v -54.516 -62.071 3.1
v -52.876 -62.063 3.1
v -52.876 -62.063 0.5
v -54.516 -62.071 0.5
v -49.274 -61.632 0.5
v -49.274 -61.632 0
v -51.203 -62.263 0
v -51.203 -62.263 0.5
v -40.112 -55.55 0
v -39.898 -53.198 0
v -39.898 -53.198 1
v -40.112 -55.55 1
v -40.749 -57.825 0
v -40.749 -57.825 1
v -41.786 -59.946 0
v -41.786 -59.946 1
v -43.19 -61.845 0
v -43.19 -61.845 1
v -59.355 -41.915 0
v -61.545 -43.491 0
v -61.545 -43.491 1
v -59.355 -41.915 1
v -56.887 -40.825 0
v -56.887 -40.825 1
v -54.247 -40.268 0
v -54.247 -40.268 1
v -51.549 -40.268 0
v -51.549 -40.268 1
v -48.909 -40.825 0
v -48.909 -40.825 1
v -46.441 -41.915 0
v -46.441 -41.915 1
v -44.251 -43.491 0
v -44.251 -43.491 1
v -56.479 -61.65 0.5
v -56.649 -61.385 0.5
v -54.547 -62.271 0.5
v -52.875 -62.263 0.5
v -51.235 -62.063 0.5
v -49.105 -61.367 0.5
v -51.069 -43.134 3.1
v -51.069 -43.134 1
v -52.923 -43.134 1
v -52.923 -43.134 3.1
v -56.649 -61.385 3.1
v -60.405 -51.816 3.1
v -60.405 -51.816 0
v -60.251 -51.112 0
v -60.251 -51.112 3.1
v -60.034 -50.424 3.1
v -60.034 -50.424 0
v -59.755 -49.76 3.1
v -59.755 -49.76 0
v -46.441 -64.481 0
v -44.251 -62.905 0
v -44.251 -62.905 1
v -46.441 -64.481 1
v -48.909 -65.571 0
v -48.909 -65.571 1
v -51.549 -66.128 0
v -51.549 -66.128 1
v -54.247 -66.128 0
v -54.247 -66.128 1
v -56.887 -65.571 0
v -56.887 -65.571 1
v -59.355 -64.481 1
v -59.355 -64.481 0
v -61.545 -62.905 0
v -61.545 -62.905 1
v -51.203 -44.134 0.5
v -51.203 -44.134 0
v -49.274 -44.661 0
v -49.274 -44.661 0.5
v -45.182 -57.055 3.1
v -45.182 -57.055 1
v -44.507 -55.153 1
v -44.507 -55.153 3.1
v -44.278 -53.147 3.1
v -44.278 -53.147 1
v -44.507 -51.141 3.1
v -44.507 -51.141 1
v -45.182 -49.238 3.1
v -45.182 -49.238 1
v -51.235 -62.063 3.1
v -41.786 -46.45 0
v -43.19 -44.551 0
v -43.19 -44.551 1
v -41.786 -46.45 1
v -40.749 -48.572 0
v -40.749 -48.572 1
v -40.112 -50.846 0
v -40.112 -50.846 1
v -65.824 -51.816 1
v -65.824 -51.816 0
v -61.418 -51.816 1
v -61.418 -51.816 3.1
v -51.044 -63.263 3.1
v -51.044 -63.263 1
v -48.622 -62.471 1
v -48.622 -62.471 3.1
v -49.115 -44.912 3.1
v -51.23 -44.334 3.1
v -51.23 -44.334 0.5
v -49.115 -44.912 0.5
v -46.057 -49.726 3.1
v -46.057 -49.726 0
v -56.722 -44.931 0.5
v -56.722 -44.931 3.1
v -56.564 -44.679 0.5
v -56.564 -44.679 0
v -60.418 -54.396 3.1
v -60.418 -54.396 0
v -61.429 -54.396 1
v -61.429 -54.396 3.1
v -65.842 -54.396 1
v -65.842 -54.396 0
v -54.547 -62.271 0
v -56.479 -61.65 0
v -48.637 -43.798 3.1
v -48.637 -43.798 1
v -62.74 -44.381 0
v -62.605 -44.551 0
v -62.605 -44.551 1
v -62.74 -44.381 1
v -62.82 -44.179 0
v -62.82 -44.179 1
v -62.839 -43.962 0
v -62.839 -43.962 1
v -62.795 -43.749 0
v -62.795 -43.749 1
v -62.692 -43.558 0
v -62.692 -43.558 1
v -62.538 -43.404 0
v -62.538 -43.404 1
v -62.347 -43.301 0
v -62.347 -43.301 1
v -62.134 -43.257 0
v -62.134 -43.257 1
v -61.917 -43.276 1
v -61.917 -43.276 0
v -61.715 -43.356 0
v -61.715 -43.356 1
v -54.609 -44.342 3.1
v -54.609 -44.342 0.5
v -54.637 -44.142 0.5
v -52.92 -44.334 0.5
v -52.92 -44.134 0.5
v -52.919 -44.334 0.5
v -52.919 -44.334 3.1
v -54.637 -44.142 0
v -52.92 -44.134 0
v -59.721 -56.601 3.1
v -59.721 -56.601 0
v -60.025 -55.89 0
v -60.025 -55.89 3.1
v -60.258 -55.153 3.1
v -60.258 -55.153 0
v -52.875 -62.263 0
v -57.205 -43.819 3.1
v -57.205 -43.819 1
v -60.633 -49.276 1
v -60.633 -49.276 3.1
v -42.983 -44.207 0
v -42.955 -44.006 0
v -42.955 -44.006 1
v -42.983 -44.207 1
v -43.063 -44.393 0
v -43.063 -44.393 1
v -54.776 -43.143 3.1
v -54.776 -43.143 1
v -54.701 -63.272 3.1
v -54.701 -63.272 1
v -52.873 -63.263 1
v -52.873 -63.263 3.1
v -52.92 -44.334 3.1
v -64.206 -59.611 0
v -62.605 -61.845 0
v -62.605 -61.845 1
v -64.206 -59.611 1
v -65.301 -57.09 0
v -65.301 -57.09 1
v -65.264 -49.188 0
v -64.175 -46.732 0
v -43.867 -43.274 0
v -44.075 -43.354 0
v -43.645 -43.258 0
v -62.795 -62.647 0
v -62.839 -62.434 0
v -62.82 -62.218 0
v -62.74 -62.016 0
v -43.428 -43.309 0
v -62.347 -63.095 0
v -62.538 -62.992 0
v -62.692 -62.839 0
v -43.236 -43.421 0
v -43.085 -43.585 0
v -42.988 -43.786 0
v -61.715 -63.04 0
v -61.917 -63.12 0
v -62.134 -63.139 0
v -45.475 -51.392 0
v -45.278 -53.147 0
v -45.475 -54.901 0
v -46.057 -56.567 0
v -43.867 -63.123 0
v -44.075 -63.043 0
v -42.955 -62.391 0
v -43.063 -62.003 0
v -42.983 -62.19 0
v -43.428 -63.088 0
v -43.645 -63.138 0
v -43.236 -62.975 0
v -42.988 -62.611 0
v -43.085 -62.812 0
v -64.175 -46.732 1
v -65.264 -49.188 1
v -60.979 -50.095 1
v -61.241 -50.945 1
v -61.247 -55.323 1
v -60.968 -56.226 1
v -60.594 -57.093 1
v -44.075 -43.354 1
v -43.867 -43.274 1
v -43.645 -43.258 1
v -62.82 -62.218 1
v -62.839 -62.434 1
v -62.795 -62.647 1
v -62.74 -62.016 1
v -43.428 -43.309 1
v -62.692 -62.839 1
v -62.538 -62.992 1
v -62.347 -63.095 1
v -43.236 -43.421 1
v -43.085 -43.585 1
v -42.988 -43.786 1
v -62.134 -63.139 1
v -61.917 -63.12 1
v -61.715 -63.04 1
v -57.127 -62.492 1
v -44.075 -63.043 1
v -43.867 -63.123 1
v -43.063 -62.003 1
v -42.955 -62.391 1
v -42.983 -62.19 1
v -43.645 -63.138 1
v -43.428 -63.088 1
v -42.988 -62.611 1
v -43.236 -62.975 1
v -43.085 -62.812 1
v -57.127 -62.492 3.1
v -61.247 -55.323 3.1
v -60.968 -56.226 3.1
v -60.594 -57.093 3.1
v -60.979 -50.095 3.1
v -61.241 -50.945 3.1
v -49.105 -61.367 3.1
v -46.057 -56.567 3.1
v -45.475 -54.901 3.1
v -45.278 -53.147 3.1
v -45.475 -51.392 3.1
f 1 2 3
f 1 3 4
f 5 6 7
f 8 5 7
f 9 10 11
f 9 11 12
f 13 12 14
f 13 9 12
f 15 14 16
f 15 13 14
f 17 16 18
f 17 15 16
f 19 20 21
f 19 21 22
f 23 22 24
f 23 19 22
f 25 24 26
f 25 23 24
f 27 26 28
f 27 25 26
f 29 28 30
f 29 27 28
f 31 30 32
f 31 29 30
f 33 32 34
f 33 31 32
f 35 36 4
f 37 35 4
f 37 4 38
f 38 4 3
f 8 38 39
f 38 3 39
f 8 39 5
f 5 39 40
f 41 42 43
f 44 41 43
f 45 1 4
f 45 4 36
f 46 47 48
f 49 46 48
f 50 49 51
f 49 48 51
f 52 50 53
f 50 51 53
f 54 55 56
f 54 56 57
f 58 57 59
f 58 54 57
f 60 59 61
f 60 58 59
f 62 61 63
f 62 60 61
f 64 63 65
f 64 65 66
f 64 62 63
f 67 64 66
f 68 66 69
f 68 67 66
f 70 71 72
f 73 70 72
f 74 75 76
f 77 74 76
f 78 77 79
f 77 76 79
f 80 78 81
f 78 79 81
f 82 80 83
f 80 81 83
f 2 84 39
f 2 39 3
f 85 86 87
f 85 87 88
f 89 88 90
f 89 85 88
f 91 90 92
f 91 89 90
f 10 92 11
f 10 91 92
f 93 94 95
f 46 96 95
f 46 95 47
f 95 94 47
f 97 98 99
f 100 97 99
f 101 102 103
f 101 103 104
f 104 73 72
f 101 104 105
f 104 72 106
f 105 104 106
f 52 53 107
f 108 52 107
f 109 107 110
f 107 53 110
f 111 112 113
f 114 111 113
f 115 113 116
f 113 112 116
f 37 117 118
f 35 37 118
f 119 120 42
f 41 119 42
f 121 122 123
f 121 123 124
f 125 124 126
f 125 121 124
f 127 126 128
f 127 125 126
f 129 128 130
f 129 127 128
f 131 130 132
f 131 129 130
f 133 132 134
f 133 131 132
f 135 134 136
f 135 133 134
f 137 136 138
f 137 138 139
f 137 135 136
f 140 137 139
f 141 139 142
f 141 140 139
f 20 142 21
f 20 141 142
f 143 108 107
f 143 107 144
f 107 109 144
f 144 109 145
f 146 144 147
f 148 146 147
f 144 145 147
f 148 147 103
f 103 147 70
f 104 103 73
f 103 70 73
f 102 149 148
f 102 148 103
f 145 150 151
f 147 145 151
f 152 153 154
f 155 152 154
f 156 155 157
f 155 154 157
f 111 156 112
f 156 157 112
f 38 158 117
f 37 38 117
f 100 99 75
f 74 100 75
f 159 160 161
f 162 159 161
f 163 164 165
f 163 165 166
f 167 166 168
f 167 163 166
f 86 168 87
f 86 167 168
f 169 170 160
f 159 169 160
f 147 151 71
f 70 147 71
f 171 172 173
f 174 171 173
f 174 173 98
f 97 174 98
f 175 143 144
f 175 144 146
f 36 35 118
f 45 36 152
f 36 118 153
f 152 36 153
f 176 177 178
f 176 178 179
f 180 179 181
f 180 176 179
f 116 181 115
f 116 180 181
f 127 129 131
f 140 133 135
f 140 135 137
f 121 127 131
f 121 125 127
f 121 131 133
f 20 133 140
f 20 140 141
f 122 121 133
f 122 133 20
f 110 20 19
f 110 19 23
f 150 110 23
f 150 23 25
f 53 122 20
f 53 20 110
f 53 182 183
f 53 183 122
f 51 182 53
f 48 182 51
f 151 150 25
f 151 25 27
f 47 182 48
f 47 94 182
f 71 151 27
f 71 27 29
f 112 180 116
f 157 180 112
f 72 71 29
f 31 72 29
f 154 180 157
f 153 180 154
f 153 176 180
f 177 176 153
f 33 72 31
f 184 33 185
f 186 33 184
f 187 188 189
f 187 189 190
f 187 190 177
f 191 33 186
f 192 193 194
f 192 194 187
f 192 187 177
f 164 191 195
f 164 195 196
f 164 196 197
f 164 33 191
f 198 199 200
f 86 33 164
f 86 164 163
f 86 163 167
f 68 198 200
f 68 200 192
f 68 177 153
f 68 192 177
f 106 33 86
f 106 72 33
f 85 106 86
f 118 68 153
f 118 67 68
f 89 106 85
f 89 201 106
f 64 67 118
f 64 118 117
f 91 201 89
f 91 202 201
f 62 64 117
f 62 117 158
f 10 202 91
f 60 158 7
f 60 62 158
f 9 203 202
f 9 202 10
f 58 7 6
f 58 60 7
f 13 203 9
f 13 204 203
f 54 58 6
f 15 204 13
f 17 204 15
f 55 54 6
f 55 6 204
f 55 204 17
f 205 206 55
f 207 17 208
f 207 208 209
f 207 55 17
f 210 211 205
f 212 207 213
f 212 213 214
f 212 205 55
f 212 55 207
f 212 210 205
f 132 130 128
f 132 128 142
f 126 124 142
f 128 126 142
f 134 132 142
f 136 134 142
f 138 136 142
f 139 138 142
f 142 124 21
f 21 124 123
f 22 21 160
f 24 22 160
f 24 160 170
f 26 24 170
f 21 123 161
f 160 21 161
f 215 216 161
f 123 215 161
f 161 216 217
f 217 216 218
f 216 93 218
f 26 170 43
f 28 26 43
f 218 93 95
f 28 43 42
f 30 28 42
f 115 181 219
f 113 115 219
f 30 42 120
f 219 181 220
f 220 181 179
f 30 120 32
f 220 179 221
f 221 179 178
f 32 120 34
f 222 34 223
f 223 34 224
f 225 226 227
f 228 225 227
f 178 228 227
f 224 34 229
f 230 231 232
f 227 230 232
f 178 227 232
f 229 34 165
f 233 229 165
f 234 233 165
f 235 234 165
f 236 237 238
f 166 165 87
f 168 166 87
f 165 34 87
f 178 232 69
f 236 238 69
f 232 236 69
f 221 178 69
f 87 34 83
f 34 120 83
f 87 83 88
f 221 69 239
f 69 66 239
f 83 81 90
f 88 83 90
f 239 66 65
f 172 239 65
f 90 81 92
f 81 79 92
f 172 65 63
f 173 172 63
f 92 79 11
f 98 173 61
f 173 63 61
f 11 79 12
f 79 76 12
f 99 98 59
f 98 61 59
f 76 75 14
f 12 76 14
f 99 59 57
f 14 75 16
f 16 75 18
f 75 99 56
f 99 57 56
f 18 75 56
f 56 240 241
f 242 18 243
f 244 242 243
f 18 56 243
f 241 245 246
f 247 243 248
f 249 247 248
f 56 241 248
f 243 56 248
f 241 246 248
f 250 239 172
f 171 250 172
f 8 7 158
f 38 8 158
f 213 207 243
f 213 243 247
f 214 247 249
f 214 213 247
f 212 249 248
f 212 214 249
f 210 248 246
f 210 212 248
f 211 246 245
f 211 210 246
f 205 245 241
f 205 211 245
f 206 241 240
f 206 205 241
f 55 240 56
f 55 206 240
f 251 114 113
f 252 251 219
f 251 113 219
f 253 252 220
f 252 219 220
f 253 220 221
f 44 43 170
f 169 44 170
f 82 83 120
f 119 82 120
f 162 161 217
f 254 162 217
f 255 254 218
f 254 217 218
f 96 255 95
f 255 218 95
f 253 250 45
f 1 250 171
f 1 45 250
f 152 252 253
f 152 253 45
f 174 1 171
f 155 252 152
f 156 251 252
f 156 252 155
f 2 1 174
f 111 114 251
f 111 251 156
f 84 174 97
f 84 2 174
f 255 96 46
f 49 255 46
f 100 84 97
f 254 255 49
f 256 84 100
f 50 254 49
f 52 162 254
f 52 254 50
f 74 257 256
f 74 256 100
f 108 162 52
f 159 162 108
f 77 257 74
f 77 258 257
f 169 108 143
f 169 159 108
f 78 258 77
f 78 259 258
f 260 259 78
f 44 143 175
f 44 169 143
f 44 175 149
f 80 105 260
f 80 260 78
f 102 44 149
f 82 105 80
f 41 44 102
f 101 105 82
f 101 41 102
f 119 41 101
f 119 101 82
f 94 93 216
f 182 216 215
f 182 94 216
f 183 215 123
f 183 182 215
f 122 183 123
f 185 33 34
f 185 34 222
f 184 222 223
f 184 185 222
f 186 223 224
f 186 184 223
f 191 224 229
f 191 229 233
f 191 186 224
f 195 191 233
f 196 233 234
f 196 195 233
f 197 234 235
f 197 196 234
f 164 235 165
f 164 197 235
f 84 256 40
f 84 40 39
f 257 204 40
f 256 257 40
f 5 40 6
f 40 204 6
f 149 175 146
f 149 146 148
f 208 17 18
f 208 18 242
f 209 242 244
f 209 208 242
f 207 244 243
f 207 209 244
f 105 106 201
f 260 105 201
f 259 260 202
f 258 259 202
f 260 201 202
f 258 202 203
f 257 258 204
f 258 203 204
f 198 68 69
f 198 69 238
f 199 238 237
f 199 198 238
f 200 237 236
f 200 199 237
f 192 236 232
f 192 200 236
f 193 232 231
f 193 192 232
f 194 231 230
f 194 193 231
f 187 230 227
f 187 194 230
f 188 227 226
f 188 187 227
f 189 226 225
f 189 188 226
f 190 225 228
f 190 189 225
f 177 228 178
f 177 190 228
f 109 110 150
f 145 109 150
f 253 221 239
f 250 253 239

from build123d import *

# Parameters (mm, degrees)
F1_DEPTH = 3.1
F3_DEPTH = 1
F5_DEPTH = 3.1
F7_DEPTH = 2.6


# Not quite as in the source:
# - ends of sketch curves that miss each other by under 0.0002 mm in the source are joined


with BuildPart() as f1:
    # F0 (on Top) → F1 (new body)
    with BuildSketch(Plane.XY):
        with BuildLine():
            Line((-45.1821846682, -49.2377741688), (-48.6372292437, -43.7981166044))
            Line((-48.6372292437, -43.7981166044), (-51.0690886894, -43.1337059986))
            Line((-51.0690886894, -43.1337059986), (-52.9226313652, -43.1337059986))
            Line((-52.9226313652, -43.1337059986), (-54.7761512226, -43.1429032238))
            Line((-54.7761512226, -43.1429032238), (-57.2046839443, -43.8193724666))
            Line((-57.2046839443, -43.8193724666), (-60.6326945623, -49.2761068966))
            ThreePointArc((-60.6326945623, -49.2761068966), (-61.5175196788, -53.1892877339), (-60.5939044307, -57.0934950318))
            Line((-60.5939044307, -57.0934950318), (-57.1270457212, -62.4923727119))
            Line((-57.1270457212, -62.4923727119), (-54.7013924586, -63.2718429691))
            Line((-54.7013924586, -63.2718429691), (-52.8726911435, -63.2627688943))
            Line((-52.8726911435, -63.2627688943), (-51.0439673156, -63.2627688943))
            Line((-51.0439673156, -63.2627688943), (-48.6222116233, -62.4712722115))
            Line((-48.6222116233, -62.4712722115), (-45.1821846682, -57.0552585424))
            ThreePointArc((-45.1821846682, -57.0552585424), (-44.2779533541, -53.1465163556), (-45.1821846682, -49.2377741688))
        make_face()
        with BuildLine():
            Line((-51.2032357795, -44.1337052485), (-49.2739452053, -44.6608085404))
            Line((-49.2739452053, -44.6608085404), (-46.0570379398, -49.725540285))
            ThreePointArc((-46.0570379398, -49.725540285), (-45.277952604, -53.1465163556), (-46.0570379398, -56.5674924262))
            Line((-46.0570379398, -56.5674924262), (-49.2739452053, -61.6322241709))
            Line((-49.2739452053, -61.6322241709), (-51.2032357795, -62.2627696444))
            Line((-51.2032357795, -62.2627696444), (-52.8751721425, -62.2627696444))
            Line((-52.8751721425, -62.2627696444), (-54.5470879228, -62.2710657443))
            Line((-54.5470879228, -62.2710657443), (-56.4794834946, -61.6501011173))
            Line((-56.4794834946, -61.6501011173), (-59.7214822105, -56.6013939237))
            ThreePointArc((-59.7214822105, -56.6013939237), (-60.5175327396, -53.1843257665), (-59.7554317793, -49.7595260114))
            Line((-59.7554317793, -49.7595260114), (-56.5636951686, -44.678894416))
            Line((-56.5636951686, -44.678894416), (-54.6370438166, -44.1422245291))
            Line((-54.6370438166, -44.1422245291), (-52.9201503662, -44.1337052485))
            Line((-52.9201503662, -44.1337052485), (-51.2032357795, -44.1337052485))
        make_face(mode=Mode.SUBTRACT)
    extrude(amount=F1_DEPTH)

    # F2 (on face) → F3 (join)
    with BuildSketch(Plane(origin=(0, 0, 0), x_dir=(1, 0, 0), z_dir=(0, 0, -1))):
        with BuildLine():
            ThreePointArc((-43.358584194, 62.0303384897), (-43.2740778057, 61.9381826183), (-43.1904616862, 61.8452182226))
            ThreePointArc((-43.1904616862, 61.8452182226), (-43.0165755747, 62.0936479592), (-42.9552730989, 62.3906256019))
            ThreePointArc((-42.9552730989, 62.3906256019), (-43.4282853143, 63.0876031964), (-44.2506804781, 62.9054370146))
            ThreePointArc((-44.2506804781, 62.9054370146), (-44.1577160825, 62.8218208951), (-44.0655602111, 62.7373145068))
            ThreePointArc((-44.0655602111, 62.7373145068), (-43.5183821629, 62.8543839205), (-43.2052730989, 62.3906256019))
            ThreePointArc((-43.2052730989, 62.3906256019), (-43.2451945988, 62.1948507981), (-43.358584194, 62.0303384897))
        make_face()
        with BuildLine():
            ThreePointArc((-44.0655602111, 62.7373145068), (-43.7052730989, 62.3906256019), (-43.358584194, 62.0303384897))
            ThreePointArc((-43.358584194, 62.0303384897), (-43.2451945988, 62.1948507981), (-43.2052730989, 62.3906256019))
            ThreePointArc((-43.2052730989, 62.3906256019), (-43.5183821629, 62.8543839205), (-44.0655602111, 62.7373145068))
        make_face()
        with BuildLine():
            ThreePointArc((-44.0655602111, 62.7373145068), (-44.0588264895, 62.0370722113), (-43.358584194, 62.0303384897))
            ThreePointArc((-43.358584194, 62.0303384897), (-43.7052730989, 62.3906256019), (-44.0655602111, 62.7373145068))
        make_face()
        with BuildLine():
            ThreePointArc((-43.1904616862, 44.5512566703), (-40.748719029, 48.5718778834), (-39.8976612543, 53.1982374465))
            ThreePointArc((-39.8976612543, 53.1982374465), (-40.748719029, 57.8245970095), (-43.1904616862, 61.8452182226))
            ThreePointArc((-43.1904616862, 61.8452182226), (-44.2356031848, 61.860295516), (-44.2506804781, 62.9054370146))
            ThreePointArc((-44.2506804781, 62.9054370146), (-52.8976612543, 66.1982374465), (-61.5446420305, 62.9054370146))
            ThreePointArc((-61.5446420305, 62.9054370146), (-61.3930718153, 62.6676133864), (-61.3400494097, 62.3906256019))
            ThreePointArc((-61.3400494097, 62.3906256019), (-61.7930717671, 61.7019280777), (-62.6048608225, 61.8452182226))
            ThreePointArc((-62.6048608225, 61.8452182226), (-65.8976612543, 53.1982374465), (-62.6048608225, 44.5512566703))
            ThreePointArc((-62.6048608225, 44.5512566703), (-61.7930717671, 44.6945468152), (-61.3400494097, 44.005849291))
            ThreePointArc((-61.3400494097, 44.005849291), (-61.3930718153, 43.7288615065), (-61.5446420305, 43.4910378783))
            ThreePointArc((-61.5446420305, 43.4910378783), (-52.8976612543, 40.1982374465), (-44.2506804781, 43.4910378783))
            ThreePointArc((-44.2506804781, 43.4910378783), (-44.2356031848, 44.5361793769), (-43.1904616862, 44.5512566703))
        make_face()
        with BuildLine():
            Line((-45.1821846682, 49.2377741688), (-48.6372292437, 43.7981166044))
            Line((-48.6372292437, 43.7981166044), (-51.0690886894, 43.1337059986))
            Line((-51.0690886894, 43.1337059986), (-52.9226313652, 43.1337059986))
            Line((-52.9226313652, 43.1337059986), (-54.7761512226, 43.1429032238))
            Line((-54.7761512226, 43.1429032238), (-57.2046839443, 43.8193724666))
            Line((-57.2046839443, 43.8193724666), (-60.6326945623, 49.2761068966))
            ThreePointArc((-60.6326945623, 49.2761068966), (-61.5175196788, 53.1892877339), (-60.5939044307, 57.0934950318))
            Line((-60.5939044307, 57.0934950318), (-57.1270457212, 62.4923727119))
            Line((-57.1270457212, 62.4923727119), (-54.7013924586, 63.2718429691))
            Line((-54.7013924586, 63.2718429691), (-52.8726911435, 63.2627688943))
            Line((-52.8726911435, 63.2627688943), (-51.0439673156, 63.2627688943))
            Line((-51.0439673156, 63.2627688943), (-48.6222116233, 62.4712722115))
            Line((-48.6222116233, 62.4712722115), (-45.1821846682, 57.0552585424))
            ThreePointArc((-45.1821846682, 57.0552585424), (-44.2779533541, 53.1465163556), (-45.1821846682, 49.2377741688))
        make_face(mode=Mode.SUBTRACT)
        with BuildLine():
            ThreePointArc((-44.2506804781, 62.9054370146), (-44.2356031848, 61.860295516), (-43.1904616862, 61.8452182226))
            ThreePointArc((-43.1904616862, 61.8452182226), (-43.2740778057, 61.9381826183), (-43.358584194, 62.0303384897))
            ThreePointArc((-43.358584194, 62.0303384897), (-44.0588264895, 62.0370722113), (-44.0655602111, 62.7373145068))
            ThreePointArc((-44.0655602111, 62.7373145068), (-44.1577160825, 62.8218208951), (-44.2506804781, 62.9054370146))
        make_face()
        with BuildLine():
            ThreePointArc((-61.7297622975, 62.7373145068), (-61.6376064262, 62.8218208951), (-61.5446420305, 62.9054370146))
            ThreePointArc((-61.5446420305, 62.9054370146), (-62.6203794956, 62.9209556878), (-62.6048608225, 61.8452182226))
            ThreePointArc((-62.6048608225, 61.8452182226), (-62.521244703, 61.9381826183), (-62.4367383146, 62.0303384897))
            ThreePointArc((-62.4367383146, 62.0303384897), (-62.4436028003, 62.7441789925), (-61.7297622975, 62.7373145068))
        make_face()
        with BuildLine():
            ThreePointArc((-61.3400494097, 62.3906256019), (-61.3930718153, 62.6676133864), (-61.5446420305, 62.9054370146))
            ThreePointArc((-61.5446420305, 62.9054370146), (-61.6376064262, 62.8218208951), (-61.7297622975, 62.7373145068))
            ThreePointArc((-61.7297622975, 62.7373145068), (-61.6262910912, 62.5775165378), (-61.5900494097, 62.3906256019))
            ThreePointArc((-61.5900494097, 62.3906256019), (-61.894274606, 61.9305471018), (-62.4367383146, 62.0303384897))
            ThreePointArc((-62.4367383146, 62.0303384897), (-62.521244703, 61.9381826183), (-62.6048608225, 61.8452182226))
            ThreePointArc((-62.6048608225, 61.8452182226), (-61.7930717671, 61.7019280777), (-61.3400494097, 62.3906256019))
        make_face()
        with BuildLine():
            ThreePointArc((-62.4367383146, 62.0303384897), (-62.0900494097, 62.3906256019), (-61.7297622975, 62.7373145068))
            ThreePointArc((-61.7297622975, 62.7373145068), (-62.4436028003, 62.7441789925), (-62.4367383146, 62.0303384897))
        make_face()
        with BuildLine():
            ThreePointArc((-61.5900494097, 62.3906256019), (-61.6262910912, 62.5775165378), (-61.7297622975, 62.7373145068))
            ThreePointArc((-61.7297622975, 62.7373145068), (-62.0900494097, 62.3906256019), (-62.4367383146, 62.0303384897))
            ThreePointArc((-62.4367383146, 62.0303384897), (-61.894274606, 61.9305471018), (-61.5900494097, 62.3906256019))
        make_face()
        with BuildLine():
            ThreePointArc((-42.9552730989, 44.005849291), (-43.0165755747, 44.3028269337), (-43.1904616862, 44.5512566703))
            ThreePointArc((-43.1904616862, 44.5512566703), (-43.2740778057, 44.4582922746), (-43.358584194, 44.3661364032))
            ThreePointArc((-43.358584194, 44.3661364032), (-43.2451945988, 44.2016240948), (-43.2052730989, 44.005849291))
            ThreePointArc((-43.2052730989, 44.005849291), (-43.5183821629, 43.5420909724), (-44.0655602111, 43.6591603861))
            ThreePointArc((-44.0655602111, 43.6591603861), (-44.1577160825, 43.5746539978), (-44.2506804781, 43.4910378783))
            ThreePointArc((-44.2506804781, 43.4910378783), (-43.4282853143, 43.3088716965), (-42.9552730989, 44.005849291))
        make_face()
        with BuildLine():
            ThreePointArc((-43.2052730989, 44.005849291), (-43.2451945988, 44.2016240948), (-43.358584194, 44.3661364032))
            ThreePointArc((-43.358584194, 44.3661364032), (-43.7052730989, 44.005849291), (-44.0655602111, 43.6591603861))
            ThreePointArc((-44.0655602111, 43.6591603861), (-43.5183821629, 43.5420909724), (-43.2052730989, 44.005849291))
        make_face()
        with BuildLine():
            ThreePointArc((-44.0655602111, 43.6591603861), (-43.7052730989, 44.005849291), (-43.358584194, 44.3661364032))
            ThreePointArc((-43.358584194, 44.3661364032), (-44.0588264895, 44.3594026816), (-44.0655602111, 43.6591603861))
        make_face()
        with BuildLine():
            ThreePointArc((-43.358584194, 44.3661364032), (-43.2740778057, 44.4582922746), (-43.1904616862, 44.5512566703))
            ThreePointArc((-43.1904616862, 44.5512566703), (-44.2356031848, 44.5361793769), (-44.2506804781, 43.4910378783))
            ThreePointArc((-44.2506804781, 43.4910378783), (-44.1577160825, 43.5746539978), (-44.0655602111, 43.6591603861))
            ThreePointArc((-44.0655602111, 43.6591603861), (-44.0588264895, 44.3594026816), (-43.358584194, 44.3661364032))
        make_face()
        with BuildLine():
            ThreePointArc((-62.6048608225, 44.5512566703), (-62.6203794956, 43.4755192051), (-61.5446420305, 43.4910378783))
            ThreePointArc((-61.5446420305, 43.4910378783), (-61.6376064262, 43.5746539978), (-61.7297622975, 43.6591603861))
            ThreePointArc((-61.7297622975, 43.6591603861), (-62.4436028003, 43.6522959004), (-62.4367383146, 44.3661364032))
            ThreePointArc((-62.4367383146, 44.3661364032), (-62.521244703, 44.4582922746), (-62.6048608225, 44.5512566703))
        make_face()
        with BuildLine():
            ThreePointArc((-62.4367383146, 44.3661364032), (-62.4436028003, 43.6522959004), (-61.7297622975, 43.6591603861))
            ThreePointArc((-61.7297622975, 43.6591603861), (-62.0900494097, 44.005849291), (-62.4367383146, 44.3661364032))
        make_face()
        with BuildLine():
            ThreePointArc((-62.4367383146, 44.3661364032), (-62.0900494097, 44.005849291), (-61.7297622975, 43.6591603861))
            ThreePointArc((-61.7297622975, 43.6591603861), (-61.6262910912, 43.8189583551), (-61.5900494097, 44.005849291))
            ThreePointArc((-61.5900494097, 44.005849291), (-61.894274606, 44.4659277911), (-62.4367383146, 44.3661364032))
        make_face()
        with BuildLine():
            ThreePointArc((-61.7297622975, 43.6591603861), (-61.6376064262, 43.5746539978), (-61.5446420305, 43.4910378783))
            ThreePointArc((-61.5446420305, 43.4910378783), (-61.3930718153, 43.7288615065), (-61.3400494097, 44.005849291))
            ThreePointArc((-61.3400494097, 44.005849291), (-61.7930717671, 44.6945468152), (-62.6048608225, 44.5512566703))
            ThreePointArc((-62.6048608225, 44.5512566703), (-62.521244703, 44.4582922746), (-62.4367383146, 44.3661364032))
            ThreePointArc((-62.4367383146, 44.3661364032), (-61.894274606, 44.4659277911), (-61.5900494097, 44.005849291))
            ThreePointArc((-61.5900494097, 44.005849291), (-61.6262910912, 43.8189583551), (-61.7297622975, 43.6591603861))
        make_face()
    extrude(amount=-F3_DEPTH)

    # F4 (on face) → F5 (cut)
    with BuildSketch(Plane(origin=(0, 0, 0), x_dir=(1, 0, 0), z_dir=(0, 0, -1))):
        with BuildLine():
            Line((-60.4180157971, 54.3957427144), (-65.8423891824, 54.3957427144))
            ThreePointArc((-65.8423891824, 54.3957427144), (-65.8973302268, 53.1054656449), (-65.8239796584, 51.8161041253))
            Line((-65.8239796584, 51.8161041253), (-60.4050414596, 51.8161041253))
            ThreePointArc((-60.4050414596, 51.8161041253), (-60.5175300761, 53.1053902837), (-60.4180157971, 54.3957427144))
        make_face()
    extrude(amount=-F5_DEPTH, mode=Mode.SUBTRACT)

    # F6 (on face) → F7 (join)
    with BuildSketch(Plane.XY.offset(3.1)):
        Polygon((-56.5636951686, -44.678894416), (-56.7217861266, -44.930544854), (-54.6092223145, -44.34208894), (-52.920150354, -44.3337077106), (-52.919157972, -44.3337027864), (-51.2300652176, -44.3337052485), (-49.1146075113, -44.9116714376), (-49.2739452053, -44.6608085404), (-51.2032357795, -44.1337052485), (-52.9201503662, -44.1337052485), (-54.6370438166, -44.1422245291), align=None)
        Polygon((-49.2739452053, -61.6322241709), (-49.1052905017, -61.3666924783), (-51.2350894961, -62.0627696444), (-52.8756683426, -62.0627696444), (-54.5162269925, -62.0709101492), (-56.6494536825, -61.3854095534), (-56.4794834946, -61.6501011173), (-54.5470879228, -62.2710657443), (-52.8751721425, -62.2627696444), (-51.2032357795, -62.2627696444), align=None)
    extrude(amount=-F7_DEPTH)


solid = f1.part
